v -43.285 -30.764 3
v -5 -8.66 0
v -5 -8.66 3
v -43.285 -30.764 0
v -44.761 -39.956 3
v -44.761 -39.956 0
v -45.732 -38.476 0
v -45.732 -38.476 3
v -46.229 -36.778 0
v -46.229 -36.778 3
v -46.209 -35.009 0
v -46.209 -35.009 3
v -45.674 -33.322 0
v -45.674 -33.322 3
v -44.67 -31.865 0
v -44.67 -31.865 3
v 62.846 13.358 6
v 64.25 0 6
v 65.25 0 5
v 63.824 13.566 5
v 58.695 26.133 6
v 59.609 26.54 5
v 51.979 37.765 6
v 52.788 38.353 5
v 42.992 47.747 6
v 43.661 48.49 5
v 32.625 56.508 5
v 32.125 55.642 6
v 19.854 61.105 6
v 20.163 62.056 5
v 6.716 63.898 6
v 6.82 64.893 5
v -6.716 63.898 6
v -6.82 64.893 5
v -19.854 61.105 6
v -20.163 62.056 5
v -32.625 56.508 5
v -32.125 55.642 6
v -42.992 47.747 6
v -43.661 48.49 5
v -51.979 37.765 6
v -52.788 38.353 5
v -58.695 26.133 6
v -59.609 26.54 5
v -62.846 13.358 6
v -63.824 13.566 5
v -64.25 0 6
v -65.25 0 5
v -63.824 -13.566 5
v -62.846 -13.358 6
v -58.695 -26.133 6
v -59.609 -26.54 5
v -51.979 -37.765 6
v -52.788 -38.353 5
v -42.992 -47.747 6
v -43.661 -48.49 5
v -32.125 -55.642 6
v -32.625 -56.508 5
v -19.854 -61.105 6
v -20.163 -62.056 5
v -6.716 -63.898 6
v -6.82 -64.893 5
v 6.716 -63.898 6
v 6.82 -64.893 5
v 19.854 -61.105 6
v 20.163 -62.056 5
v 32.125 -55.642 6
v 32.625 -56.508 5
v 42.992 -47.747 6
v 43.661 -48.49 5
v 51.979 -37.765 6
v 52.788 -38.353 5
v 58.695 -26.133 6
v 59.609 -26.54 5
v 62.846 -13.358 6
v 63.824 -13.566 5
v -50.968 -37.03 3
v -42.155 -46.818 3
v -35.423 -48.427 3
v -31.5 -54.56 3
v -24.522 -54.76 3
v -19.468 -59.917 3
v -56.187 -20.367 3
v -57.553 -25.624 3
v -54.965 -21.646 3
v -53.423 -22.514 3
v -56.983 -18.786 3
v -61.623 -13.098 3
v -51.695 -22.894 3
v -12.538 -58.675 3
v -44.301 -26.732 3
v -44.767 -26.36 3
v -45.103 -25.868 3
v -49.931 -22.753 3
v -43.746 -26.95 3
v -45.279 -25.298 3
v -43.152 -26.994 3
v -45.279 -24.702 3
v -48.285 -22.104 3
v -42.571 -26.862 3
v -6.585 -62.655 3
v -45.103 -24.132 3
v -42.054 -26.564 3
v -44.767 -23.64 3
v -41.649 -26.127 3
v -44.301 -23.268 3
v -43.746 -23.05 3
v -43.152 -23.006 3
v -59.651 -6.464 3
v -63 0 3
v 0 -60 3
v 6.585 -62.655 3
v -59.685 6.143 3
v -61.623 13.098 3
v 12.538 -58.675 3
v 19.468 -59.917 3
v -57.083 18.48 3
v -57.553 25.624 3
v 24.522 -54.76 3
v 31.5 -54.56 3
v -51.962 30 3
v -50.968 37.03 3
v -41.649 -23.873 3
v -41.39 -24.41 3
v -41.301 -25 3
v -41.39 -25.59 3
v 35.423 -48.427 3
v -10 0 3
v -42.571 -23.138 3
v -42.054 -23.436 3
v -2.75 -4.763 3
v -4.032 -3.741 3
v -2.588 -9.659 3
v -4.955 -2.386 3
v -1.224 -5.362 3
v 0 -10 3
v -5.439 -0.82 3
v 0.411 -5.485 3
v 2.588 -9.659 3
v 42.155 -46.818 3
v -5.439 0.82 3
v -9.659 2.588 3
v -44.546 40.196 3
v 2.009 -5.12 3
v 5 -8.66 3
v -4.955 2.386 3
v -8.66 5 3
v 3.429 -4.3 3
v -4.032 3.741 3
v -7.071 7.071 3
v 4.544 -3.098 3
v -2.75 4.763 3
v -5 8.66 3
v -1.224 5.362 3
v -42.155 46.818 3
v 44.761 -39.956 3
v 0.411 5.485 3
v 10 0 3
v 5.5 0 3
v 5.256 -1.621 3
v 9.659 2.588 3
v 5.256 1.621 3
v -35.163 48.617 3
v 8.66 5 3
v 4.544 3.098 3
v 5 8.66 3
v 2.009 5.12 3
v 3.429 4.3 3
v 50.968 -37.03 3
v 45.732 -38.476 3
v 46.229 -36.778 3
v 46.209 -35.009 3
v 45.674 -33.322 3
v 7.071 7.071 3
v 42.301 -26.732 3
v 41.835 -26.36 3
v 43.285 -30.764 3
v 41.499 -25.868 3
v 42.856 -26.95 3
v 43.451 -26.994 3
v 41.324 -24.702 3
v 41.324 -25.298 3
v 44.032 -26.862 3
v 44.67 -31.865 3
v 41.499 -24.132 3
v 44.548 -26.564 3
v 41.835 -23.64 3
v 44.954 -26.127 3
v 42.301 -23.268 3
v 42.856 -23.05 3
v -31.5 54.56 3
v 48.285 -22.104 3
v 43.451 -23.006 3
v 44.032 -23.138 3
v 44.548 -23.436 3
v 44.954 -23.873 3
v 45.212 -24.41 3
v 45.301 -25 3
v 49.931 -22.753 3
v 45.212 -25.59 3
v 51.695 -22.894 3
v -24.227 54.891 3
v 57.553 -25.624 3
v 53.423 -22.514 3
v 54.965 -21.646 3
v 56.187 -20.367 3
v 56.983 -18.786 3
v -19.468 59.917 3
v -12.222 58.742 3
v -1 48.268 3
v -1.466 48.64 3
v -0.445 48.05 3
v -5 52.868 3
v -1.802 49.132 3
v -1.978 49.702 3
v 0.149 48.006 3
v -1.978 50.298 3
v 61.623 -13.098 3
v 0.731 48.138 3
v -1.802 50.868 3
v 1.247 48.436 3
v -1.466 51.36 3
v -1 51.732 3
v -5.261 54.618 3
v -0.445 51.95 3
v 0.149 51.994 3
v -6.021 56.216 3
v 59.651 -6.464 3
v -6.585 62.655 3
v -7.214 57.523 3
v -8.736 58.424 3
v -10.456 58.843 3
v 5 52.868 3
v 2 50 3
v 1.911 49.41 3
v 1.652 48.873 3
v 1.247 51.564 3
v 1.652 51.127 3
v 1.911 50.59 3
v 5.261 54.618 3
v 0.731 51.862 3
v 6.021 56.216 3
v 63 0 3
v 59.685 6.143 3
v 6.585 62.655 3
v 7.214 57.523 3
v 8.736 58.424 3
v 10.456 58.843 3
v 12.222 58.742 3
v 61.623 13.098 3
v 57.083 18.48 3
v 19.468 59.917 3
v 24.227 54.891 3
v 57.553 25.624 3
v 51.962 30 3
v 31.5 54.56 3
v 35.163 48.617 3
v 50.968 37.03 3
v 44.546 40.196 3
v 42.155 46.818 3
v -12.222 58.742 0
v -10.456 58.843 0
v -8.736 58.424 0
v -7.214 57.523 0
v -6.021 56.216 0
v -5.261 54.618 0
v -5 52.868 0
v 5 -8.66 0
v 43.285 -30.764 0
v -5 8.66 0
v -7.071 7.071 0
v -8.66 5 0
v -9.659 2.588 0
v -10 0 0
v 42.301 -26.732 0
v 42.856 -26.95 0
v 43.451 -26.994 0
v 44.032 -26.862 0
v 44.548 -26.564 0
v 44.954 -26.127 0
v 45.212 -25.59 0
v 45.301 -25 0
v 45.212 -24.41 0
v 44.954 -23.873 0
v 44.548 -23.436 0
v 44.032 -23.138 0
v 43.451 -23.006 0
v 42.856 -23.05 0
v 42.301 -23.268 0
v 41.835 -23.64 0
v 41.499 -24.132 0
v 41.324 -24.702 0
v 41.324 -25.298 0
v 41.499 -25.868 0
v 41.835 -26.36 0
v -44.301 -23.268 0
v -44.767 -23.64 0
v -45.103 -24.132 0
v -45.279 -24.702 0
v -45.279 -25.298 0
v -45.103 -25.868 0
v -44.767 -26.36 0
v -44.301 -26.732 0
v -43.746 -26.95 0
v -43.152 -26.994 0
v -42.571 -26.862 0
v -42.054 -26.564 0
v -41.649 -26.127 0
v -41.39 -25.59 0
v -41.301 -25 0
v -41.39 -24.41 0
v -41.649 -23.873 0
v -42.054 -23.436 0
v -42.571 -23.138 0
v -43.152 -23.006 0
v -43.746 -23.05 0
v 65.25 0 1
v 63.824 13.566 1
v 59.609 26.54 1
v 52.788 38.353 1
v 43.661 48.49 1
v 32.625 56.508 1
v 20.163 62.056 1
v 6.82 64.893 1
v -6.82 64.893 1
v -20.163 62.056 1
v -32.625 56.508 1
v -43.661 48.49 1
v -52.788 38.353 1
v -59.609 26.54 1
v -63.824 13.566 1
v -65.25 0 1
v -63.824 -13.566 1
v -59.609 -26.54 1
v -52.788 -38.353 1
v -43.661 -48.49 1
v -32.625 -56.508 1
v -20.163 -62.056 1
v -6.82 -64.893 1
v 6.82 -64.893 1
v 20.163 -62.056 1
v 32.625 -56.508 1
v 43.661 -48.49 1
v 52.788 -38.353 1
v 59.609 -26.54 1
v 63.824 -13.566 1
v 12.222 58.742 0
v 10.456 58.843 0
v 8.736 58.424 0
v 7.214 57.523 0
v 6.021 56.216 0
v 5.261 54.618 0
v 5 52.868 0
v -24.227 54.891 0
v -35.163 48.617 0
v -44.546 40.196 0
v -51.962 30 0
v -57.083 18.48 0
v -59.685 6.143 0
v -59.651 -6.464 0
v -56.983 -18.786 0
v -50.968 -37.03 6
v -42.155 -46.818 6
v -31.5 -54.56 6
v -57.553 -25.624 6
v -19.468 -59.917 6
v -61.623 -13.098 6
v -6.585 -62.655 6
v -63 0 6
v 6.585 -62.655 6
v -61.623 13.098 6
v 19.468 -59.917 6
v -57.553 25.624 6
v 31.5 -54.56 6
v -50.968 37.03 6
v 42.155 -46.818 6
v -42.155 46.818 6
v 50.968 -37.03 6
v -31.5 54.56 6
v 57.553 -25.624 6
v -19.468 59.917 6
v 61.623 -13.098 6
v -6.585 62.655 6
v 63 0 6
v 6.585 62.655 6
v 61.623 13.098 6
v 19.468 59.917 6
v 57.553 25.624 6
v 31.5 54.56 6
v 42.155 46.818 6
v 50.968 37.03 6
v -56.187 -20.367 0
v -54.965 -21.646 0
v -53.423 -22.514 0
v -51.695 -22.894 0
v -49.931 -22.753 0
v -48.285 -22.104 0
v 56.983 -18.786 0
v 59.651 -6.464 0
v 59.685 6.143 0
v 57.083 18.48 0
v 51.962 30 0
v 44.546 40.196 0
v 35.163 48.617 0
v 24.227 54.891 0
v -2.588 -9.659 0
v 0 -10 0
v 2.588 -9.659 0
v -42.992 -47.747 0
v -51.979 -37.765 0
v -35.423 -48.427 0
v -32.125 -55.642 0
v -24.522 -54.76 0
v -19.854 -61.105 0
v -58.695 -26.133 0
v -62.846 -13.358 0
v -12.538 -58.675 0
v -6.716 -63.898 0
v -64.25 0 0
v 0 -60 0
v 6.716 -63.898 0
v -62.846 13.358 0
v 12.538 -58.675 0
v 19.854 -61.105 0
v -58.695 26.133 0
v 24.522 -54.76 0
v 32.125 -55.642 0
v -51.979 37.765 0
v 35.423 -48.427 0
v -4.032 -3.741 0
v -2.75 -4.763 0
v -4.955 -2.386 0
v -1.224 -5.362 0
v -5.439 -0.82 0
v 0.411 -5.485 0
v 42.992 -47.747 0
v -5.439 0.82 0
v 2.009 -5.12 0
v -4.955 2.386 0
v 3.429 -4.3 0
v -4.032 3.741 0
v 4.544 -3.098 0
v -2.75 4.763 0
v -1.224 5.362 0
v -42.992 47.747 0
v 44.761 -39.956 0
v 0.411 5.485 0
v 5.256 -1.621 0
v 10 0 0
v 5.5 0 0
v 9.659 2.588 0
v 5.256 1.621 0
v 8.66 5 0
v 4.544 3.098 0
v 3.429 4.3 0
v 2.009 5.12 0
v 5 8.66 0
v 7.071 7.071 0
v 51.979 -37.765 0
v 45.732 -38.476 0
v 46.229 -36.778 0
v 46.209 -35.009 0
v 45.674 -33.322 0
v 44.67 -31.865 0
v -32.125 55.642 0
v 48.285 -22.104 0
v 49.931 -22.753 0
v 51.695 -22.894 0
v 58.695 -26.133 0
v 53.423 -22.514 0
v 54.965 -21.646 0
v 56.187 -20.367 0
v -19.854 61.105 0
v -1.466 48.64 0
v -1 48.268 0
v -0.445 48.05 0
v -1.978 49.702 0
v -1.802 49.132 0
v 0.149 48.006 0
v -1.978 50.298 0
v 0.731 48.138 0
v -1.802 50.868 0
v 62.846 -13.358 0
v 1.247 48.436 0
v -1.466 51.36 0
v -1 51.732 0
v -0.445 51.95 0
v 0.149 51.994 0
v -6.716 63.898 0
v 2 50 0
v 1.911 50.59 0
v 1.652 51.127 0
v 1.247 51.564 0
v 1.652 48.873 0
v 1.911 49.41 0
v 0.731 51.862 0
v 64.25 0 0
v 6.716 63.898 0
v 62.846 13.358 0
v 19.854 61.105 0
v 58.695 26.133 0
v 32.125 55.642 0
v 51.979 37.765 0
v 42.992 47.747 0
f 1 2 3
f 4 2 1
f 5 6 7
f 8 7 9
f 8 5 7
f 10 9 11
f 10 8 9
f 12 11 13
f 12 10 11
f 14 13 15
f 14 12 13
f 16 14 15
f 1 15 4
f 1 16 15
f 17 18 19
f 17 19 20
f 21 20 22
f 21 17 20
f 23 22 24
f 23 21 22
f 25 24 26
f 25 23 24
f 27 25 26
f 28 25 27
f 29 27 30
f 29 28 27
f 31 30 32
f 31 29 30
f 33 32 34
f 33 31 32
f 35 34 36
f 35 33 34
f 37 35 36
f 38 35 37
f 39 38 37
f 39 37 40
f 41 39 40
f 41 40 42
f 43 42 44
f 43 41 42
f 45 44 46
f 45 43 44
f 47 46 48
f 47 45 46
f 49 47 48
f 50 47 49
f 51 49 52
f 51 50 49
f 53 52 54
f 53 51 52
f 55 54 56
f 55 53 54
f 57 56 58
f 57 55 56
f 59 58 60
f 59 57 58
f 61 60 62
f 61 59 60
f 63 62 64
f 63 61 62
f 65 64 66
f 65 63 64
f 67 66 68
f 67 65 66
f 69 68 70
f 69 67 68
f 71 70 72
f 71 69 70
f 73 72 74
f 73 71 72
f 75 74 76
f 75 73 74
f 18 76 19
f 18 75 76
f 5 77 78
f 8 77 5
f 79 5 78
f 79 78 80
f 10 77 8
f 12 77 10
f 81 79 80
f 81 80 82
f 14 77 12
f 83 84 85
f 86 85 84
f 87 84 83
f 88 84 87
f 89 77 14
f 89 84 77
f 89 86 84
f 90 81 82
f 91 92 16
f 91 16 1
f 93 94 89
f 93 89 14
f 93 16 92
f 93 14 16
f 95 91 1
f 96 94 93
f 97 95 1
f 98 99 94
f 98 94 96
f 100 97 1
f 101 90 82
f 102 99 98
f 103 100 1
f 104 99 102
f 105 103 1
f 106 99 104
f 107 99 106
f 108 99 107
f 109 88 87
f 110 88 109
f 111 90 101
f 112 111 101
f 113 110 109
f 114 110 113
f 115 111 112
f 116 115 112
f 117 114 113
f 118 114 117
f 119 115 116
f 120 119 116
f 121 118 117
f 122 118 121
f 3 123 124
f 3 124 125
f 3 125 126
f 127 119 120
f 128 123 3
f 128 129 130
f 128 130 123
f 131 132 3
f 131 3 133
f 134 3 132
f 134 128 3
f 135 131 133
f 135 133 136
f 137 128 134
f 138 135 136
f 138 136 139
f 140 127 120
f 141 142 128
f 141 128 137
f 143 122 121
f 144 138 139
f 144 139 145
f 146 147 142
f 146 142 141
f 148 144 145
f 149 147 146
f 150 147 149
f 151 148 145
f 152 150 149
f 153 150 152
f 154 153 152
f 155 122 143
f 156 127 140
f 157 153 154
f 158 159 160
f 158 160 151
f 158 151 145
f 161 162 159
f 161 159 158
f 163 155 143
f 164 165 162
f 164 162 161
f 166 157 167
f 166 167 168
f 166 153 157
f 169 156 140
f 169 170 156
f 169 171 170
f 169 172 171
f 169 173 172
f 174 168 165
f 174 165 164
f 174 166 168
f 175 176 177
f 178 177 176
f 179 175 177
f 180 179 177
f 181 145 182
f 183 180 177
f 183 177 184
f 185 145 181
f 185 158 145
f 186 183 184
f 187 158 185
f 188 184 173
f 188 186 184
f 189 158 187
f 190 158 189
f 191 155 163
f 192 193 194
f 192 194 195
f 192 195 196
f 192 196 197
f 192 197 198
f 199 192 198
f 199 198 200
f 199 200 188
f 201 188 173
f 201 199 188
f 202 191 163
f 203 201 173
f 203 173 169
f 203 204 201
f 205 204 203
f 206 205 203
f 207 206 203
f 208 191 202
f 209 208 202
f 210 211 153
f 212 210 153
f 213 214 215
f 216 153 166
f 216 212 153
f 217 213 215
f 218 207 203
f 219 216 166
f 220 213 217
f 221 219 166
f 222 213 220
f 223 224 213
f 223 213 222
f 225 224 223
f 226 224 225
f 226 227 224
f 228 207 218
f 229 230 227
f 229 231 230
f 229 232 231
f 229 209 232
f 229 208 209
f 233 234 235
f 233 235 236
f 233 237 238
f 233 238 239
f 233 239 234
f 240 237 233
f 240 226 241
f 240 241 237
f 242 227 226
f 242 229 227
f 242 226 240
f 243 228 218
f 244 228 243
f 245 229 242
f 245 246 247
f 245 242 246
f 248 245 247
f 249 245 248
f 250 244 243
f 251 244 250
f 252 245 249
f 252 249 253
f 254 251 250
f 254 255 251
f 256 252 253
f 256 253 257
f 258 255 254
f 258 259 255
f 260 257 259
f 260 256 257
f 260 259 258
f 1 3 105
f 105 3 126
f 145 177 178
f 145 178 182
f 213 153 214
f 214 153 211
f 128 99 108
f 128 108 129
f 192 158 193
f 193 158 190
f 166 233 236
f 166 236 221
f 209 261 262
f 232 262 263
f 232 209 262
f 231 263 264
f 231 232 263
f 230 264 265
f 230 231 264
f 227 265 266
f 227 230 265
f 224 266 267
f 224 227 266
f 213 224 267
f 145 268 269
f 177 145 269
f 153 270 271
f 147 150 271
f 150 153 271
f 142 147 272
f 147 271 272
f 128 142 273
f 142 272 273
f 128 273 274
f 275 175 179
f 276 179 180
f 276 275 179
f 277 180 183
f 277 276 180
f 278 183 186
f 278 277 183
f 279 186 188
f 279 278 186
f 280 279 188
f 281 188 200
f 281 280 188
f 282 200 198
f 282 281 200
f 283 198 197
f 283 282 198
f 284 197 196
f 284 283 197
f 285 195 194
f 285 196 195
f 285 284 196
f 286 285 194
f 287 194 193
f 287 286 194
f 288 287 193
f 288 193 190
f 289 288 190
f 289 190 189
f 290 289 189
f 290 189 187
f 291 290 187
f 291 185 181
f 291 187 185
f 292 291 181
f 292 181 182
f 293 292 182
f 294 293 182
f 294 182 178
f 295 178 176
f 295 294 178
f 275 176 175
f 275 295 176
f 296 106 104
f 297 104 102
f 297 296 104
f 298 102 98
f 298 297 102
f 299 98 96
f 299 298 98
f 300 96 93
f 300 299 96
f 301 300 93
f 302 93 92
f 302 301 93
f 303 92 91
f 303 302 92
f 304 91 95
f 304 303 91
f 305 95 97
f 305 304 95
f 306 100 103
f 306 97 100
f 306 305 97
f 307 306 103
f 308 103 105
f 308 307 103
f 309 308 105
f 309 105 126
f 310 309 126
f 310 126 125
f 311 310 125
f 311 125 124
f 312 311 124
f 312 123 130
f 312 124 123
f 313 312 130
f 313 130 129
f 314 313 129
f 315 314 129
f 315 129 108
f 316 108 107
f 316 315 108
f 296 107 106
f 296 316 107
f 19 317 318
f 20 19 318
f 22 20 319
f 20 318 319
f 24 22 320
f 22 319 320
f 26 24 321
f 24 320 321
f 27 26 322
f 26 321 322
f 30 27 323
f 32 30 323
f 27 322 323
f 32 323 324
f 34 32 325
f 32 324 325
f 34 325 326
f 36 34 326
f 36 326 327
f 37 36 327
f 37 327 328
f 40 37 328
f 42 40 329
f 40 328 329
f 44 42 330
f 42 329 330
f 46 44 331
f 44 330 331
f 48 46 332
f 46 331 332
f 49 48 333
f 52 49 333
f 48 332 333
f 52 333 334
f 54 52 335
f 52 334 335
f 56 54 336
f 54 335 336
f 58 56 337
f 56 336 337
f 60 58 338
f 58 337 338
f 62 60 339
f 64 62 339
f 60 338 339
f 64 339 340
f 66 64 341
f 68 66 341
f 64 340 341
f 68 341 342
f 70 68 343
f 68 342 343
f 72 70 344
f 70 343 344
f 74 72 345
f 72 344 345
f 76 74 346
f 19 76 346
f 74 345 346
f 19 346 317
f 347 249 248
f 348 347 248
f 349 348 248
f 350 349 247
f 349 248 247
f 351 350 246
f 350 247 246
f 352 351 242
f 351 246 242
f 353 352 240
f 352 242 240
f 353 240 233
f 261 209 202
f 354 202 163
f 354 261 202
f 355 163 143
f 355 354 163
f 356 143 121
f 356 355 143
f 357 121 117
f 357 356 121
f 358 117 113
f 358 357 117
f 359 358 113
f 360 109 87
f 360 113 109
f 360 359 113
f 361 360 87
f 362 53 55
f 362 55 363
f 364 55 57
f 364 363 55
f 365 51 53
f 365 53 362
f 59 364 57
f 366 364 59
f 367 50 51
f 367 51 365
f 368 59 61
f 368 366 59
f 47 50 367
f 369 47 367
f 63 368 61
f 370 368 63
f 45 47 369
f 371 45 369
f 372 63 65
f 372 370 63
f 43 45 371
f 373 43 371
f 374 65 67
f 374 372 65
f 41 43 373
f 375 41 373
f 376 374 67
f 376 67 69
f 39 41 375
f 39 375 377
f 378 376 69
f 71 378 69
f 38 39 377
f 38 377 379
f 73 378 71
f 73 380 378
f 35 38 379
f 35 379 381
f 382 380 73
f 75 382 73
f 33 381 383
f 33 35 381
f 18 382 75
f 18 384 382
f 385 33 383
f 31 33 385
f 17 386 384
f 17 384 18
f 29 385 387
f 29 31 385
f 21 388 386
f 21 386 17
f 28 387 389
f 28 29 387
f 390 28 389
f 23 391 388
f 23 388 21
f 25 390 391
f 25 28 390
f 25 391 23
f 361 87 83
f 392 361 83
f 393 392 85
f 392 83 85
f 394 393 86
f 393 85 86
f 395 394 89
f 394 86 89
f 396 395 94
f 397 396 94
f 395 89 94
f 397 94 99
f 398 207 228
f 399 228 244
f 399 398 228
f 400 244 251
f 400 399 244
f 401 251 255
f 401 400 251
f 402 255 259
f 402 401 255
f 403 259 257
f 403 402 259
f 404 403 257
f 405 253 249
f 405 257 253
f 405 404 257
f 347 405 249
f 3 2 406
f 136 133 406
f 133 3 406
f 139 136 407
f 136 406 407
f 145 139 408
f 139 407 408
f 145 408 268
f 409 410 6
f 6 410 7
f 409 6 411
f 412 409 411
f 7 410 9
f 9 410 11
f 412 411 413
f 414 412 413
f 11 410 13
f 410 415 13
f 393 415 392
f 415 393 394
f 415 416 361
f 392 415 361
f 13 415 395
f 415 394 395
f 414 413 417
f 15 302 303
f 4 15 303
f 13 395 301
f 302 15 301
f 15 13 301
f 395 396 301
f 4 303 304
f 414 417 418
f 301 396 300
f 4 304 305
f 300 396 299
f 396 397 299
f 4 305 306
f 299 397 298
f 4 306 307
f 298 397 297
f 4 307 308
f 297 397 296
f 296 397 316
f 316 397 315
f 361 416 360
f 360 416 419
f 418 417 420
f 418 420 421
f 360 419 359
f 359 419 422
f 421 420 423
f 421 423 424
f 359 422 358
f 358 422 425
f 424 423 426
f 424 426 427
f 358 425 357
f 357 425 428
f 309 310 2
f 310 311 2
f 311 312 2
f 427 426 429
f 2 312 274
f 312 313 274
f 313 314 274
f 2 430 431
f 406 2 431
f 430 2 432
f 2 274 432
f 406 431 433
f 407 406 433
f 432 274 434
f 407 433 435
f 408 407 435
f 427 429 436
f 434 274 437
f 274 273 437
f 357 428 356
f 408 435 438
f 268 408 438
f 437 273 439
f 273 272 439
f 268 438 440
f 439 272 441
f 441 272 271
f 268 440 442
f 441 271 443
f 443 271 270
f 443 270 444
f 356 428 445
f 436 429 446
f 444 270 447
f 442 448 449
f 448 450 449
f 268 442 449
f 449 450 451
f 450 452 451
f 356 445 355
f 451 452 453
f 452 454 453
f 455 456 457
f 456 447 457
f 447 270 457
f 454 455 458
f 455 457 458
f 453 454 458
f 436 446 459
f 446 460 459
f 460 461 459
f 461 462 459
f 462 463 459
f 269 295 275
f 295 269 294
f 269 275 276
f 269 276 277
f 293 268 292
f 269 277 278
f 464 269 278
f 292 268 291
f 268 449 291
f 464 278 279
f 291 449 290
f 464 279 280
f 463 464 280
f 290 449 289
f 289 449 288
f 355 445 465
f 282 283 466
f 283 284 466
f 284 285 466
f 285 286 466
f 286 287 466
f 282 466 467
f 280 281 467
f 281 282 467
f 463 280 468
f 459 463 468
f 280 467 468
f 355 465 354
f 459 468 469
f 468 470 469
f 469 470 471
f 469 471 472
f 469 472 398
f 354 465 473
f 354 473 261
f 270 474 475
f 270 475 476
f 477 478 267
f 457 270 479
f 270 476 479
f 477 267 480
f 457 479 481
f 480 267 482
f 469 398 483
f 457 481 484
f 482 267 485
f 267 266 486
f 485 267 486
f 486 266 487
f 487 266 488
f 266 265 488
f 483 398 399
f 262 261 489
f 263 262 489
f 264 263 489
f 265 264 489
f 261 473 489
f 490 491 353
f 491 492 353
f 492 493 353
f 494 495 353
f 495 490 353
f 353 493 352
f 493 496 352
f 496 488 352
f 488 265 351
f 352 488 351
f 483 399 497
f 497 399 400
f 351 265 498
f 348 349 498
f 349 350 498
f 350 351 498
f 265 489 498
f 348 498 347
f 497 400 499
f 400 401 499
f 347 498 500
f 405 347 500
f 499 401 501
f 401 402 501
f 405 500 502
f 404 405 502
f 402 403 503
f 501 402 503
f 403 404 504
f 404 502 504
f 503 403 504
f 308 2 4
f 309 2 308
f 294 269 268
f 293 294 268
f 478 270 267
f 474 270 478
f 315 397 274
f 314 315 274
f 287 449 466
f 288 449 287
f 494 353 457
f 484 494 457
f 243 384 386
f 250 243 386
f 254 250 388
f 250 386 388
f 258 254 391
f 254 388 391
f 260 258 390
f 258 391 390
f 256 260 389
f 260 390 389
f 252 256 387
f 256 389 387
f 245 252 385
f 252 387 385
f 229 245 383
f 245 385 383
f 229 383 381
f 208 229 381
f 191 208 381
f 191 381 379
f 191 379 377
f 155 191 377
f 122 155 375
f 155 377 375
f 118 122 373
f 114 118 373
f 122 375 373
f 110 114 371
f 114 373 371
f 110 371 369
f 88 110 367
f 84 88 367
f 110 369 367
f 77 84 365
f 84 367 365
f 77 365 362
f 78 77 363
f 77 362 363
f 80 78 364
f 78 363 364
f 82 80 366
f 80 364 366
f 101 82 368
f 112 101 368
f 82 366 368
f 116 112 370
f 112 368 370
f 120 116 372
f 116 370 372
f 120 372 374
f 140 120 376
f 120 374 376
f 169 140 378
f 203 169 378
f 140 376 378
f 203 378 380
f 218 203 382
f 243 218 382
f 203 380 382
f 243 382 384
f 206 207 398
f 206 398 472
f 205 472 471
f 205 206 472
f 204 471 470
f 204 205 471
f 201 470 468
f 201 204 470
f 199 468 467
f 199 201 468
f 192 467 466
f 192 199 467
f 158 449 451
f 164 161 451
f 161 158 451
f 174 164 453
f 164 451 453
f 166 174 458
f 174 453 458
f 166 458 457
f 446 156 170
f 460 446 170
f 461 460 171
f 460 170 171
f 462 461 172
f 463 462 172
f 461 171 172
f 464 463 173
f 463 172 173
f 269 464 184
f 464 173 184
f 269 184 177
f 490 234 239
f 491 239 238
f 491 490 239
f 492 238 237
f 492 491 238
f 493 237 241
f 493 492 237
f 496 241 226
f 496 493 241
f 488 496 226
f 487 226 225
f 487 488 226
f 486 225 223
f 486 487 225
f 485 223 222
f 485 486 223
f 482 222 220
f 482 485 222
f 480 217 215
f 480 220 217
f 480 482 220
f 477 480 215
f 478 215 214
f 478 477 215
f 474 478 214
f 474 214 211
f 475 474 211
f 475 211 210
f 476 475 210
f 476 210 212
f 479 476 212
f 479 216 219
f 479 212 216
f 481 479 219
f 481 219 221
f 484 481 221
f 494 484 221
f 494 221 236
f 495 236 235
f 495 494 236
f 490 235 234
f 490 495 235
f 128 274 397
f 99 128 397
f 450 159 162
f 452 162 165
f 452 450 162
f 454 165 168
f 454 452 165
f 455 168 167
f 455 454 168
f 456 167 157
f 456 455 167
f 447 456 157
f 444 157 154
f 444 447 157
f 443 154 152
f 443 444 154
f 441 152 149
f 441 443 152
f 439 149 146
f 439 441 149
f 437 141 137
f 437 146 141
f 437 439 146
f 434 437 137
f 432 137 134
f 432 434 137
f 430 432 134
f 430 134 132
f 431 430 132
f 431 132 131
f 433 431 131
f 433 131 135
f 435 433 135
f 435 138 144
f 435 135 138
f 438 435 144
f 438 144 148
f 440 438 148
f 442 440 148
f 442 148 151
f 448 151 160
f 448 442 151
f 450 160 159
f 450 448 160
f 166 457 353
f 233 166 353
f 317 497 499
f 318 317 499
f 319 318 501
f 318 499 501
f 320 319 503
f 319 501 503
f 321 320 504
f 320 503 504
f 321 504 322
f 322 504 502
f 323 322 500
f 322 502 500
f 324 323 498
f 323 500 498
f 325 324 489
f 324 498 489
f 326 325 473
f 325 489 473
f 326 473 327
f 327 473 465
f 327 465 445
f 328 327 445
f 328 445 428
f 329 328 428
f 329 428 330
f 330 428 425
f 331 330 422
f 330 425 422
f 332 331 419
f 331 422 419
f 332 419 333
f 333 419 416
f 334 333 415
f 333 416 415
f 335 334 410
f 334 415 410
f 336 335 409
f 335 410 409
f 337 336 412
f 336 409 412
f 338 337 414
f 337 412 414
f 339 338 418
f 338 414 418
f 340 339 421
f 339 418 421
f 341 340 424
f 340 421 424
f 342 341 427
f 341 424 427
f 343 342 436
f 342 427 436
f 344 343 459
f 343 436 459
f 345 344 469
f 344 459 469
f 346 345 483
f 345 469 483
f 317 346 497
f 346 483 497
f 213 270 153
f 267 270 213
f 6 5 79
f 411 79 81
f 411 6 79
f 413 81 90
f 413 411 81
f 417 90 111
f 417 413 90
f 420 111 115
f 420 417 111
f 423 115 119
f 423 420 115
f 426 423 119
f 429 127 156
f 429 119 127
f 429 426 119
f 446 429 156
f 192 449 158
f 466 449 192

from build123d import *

# Parameters (mm, degrees)
SKETCH_R           = 65.25
PAD_DEPTH          = 6
SKETCH001_R        = 5.5
POCKET_DEPTH       = 6.001
SKETCH002_R        = 2
POCKET001_DEPTH    = 375.305752
POLARPATTERN_COUNT = 3
CHAMFER_SIZE       = 1
FILLET_R           = 6
SKETCH003_R        = 63
POCKET002_DEPTH    = 3


with BuildPart() as part:
    # Sketch → Pad (new body)
    with BuildSketch(Plane.XY):
        Circle(SKETCH_R)
    extrude(amount=PAD_DEPTH)

    # Sketch001 → Pocket (cut, through all)
    with BuildSketch(Plane.XY):
        Circle(SKETCH001_R)
    extrude(amount=POCKET_DEPTH, mode=Mode.SUBTRACT)

    # Sketch002 → Pocket001 (cut, through all)
    with BuildSketch(Plane.XY):
        with Locations((0, 50)):
            Circle(SKETCH002_R)
        with BuildLine():
            ThreePointArc((-5, 59.791304), (-51.961524, 30), (-54.280788, -25.565525))
            Line((-10, 0), (-54.280788, -25.565525))
            ThreePointArc((-5, 8.660254), (-8.660254, 5), (-10, 0))
            Line((-5, 8.660254), (-5, 59.791304))
        make_face()
    pocket001 = extrude(amount=POCKET001_DEPTH, mode=Mode.SUBTRACT)

    # PolarPattern: Pocket001 ×3 about axis
    polarpattern_axis = Axis((0, 0, 0), (0, 0, 1))
    for i in range(1, POLARPATTERN_COUNT):
        add(pocket001.rotate(polarpattern_axis, i * 360 / POLARPATTERN_COUNT), mode=Mode.SUBTRACT)

    # Chamfer
    chamfer_edges = [part.edges().sort_by_distance(p)[0] for p in [
        (-65.25, 0, 6),
        (-65.25, 0, 0),
    ]]
    chamfer(chamfer_edges, length=CHAMFER_SIZE)

    # Fillet
    fillet_edges = [part.edges().sort_by_distance(p)[0] for p in [
        (-54.280788, -25.565525, 3),
        (-5, 59.791304, 3),
        (5, 59.791304, 3),
        (54.280788, -25.565525, 3),
        (49.280788, -34.225779, 3),
        (-49.280788, -34.225779, 3),
    ]]
    fillet(fillet_edges, radius=FILLET_R)

    # Sketch003 (on Face25 of Fillet) → Pocket002 (cut)
    with BuildSketch(Plane.XY.offset(6)):
        Circle(SKETCH003_R)
    extrude(amount=-POCKET002_DEPTH, mode=Mode.SUBTRACT)


solid = part.part
